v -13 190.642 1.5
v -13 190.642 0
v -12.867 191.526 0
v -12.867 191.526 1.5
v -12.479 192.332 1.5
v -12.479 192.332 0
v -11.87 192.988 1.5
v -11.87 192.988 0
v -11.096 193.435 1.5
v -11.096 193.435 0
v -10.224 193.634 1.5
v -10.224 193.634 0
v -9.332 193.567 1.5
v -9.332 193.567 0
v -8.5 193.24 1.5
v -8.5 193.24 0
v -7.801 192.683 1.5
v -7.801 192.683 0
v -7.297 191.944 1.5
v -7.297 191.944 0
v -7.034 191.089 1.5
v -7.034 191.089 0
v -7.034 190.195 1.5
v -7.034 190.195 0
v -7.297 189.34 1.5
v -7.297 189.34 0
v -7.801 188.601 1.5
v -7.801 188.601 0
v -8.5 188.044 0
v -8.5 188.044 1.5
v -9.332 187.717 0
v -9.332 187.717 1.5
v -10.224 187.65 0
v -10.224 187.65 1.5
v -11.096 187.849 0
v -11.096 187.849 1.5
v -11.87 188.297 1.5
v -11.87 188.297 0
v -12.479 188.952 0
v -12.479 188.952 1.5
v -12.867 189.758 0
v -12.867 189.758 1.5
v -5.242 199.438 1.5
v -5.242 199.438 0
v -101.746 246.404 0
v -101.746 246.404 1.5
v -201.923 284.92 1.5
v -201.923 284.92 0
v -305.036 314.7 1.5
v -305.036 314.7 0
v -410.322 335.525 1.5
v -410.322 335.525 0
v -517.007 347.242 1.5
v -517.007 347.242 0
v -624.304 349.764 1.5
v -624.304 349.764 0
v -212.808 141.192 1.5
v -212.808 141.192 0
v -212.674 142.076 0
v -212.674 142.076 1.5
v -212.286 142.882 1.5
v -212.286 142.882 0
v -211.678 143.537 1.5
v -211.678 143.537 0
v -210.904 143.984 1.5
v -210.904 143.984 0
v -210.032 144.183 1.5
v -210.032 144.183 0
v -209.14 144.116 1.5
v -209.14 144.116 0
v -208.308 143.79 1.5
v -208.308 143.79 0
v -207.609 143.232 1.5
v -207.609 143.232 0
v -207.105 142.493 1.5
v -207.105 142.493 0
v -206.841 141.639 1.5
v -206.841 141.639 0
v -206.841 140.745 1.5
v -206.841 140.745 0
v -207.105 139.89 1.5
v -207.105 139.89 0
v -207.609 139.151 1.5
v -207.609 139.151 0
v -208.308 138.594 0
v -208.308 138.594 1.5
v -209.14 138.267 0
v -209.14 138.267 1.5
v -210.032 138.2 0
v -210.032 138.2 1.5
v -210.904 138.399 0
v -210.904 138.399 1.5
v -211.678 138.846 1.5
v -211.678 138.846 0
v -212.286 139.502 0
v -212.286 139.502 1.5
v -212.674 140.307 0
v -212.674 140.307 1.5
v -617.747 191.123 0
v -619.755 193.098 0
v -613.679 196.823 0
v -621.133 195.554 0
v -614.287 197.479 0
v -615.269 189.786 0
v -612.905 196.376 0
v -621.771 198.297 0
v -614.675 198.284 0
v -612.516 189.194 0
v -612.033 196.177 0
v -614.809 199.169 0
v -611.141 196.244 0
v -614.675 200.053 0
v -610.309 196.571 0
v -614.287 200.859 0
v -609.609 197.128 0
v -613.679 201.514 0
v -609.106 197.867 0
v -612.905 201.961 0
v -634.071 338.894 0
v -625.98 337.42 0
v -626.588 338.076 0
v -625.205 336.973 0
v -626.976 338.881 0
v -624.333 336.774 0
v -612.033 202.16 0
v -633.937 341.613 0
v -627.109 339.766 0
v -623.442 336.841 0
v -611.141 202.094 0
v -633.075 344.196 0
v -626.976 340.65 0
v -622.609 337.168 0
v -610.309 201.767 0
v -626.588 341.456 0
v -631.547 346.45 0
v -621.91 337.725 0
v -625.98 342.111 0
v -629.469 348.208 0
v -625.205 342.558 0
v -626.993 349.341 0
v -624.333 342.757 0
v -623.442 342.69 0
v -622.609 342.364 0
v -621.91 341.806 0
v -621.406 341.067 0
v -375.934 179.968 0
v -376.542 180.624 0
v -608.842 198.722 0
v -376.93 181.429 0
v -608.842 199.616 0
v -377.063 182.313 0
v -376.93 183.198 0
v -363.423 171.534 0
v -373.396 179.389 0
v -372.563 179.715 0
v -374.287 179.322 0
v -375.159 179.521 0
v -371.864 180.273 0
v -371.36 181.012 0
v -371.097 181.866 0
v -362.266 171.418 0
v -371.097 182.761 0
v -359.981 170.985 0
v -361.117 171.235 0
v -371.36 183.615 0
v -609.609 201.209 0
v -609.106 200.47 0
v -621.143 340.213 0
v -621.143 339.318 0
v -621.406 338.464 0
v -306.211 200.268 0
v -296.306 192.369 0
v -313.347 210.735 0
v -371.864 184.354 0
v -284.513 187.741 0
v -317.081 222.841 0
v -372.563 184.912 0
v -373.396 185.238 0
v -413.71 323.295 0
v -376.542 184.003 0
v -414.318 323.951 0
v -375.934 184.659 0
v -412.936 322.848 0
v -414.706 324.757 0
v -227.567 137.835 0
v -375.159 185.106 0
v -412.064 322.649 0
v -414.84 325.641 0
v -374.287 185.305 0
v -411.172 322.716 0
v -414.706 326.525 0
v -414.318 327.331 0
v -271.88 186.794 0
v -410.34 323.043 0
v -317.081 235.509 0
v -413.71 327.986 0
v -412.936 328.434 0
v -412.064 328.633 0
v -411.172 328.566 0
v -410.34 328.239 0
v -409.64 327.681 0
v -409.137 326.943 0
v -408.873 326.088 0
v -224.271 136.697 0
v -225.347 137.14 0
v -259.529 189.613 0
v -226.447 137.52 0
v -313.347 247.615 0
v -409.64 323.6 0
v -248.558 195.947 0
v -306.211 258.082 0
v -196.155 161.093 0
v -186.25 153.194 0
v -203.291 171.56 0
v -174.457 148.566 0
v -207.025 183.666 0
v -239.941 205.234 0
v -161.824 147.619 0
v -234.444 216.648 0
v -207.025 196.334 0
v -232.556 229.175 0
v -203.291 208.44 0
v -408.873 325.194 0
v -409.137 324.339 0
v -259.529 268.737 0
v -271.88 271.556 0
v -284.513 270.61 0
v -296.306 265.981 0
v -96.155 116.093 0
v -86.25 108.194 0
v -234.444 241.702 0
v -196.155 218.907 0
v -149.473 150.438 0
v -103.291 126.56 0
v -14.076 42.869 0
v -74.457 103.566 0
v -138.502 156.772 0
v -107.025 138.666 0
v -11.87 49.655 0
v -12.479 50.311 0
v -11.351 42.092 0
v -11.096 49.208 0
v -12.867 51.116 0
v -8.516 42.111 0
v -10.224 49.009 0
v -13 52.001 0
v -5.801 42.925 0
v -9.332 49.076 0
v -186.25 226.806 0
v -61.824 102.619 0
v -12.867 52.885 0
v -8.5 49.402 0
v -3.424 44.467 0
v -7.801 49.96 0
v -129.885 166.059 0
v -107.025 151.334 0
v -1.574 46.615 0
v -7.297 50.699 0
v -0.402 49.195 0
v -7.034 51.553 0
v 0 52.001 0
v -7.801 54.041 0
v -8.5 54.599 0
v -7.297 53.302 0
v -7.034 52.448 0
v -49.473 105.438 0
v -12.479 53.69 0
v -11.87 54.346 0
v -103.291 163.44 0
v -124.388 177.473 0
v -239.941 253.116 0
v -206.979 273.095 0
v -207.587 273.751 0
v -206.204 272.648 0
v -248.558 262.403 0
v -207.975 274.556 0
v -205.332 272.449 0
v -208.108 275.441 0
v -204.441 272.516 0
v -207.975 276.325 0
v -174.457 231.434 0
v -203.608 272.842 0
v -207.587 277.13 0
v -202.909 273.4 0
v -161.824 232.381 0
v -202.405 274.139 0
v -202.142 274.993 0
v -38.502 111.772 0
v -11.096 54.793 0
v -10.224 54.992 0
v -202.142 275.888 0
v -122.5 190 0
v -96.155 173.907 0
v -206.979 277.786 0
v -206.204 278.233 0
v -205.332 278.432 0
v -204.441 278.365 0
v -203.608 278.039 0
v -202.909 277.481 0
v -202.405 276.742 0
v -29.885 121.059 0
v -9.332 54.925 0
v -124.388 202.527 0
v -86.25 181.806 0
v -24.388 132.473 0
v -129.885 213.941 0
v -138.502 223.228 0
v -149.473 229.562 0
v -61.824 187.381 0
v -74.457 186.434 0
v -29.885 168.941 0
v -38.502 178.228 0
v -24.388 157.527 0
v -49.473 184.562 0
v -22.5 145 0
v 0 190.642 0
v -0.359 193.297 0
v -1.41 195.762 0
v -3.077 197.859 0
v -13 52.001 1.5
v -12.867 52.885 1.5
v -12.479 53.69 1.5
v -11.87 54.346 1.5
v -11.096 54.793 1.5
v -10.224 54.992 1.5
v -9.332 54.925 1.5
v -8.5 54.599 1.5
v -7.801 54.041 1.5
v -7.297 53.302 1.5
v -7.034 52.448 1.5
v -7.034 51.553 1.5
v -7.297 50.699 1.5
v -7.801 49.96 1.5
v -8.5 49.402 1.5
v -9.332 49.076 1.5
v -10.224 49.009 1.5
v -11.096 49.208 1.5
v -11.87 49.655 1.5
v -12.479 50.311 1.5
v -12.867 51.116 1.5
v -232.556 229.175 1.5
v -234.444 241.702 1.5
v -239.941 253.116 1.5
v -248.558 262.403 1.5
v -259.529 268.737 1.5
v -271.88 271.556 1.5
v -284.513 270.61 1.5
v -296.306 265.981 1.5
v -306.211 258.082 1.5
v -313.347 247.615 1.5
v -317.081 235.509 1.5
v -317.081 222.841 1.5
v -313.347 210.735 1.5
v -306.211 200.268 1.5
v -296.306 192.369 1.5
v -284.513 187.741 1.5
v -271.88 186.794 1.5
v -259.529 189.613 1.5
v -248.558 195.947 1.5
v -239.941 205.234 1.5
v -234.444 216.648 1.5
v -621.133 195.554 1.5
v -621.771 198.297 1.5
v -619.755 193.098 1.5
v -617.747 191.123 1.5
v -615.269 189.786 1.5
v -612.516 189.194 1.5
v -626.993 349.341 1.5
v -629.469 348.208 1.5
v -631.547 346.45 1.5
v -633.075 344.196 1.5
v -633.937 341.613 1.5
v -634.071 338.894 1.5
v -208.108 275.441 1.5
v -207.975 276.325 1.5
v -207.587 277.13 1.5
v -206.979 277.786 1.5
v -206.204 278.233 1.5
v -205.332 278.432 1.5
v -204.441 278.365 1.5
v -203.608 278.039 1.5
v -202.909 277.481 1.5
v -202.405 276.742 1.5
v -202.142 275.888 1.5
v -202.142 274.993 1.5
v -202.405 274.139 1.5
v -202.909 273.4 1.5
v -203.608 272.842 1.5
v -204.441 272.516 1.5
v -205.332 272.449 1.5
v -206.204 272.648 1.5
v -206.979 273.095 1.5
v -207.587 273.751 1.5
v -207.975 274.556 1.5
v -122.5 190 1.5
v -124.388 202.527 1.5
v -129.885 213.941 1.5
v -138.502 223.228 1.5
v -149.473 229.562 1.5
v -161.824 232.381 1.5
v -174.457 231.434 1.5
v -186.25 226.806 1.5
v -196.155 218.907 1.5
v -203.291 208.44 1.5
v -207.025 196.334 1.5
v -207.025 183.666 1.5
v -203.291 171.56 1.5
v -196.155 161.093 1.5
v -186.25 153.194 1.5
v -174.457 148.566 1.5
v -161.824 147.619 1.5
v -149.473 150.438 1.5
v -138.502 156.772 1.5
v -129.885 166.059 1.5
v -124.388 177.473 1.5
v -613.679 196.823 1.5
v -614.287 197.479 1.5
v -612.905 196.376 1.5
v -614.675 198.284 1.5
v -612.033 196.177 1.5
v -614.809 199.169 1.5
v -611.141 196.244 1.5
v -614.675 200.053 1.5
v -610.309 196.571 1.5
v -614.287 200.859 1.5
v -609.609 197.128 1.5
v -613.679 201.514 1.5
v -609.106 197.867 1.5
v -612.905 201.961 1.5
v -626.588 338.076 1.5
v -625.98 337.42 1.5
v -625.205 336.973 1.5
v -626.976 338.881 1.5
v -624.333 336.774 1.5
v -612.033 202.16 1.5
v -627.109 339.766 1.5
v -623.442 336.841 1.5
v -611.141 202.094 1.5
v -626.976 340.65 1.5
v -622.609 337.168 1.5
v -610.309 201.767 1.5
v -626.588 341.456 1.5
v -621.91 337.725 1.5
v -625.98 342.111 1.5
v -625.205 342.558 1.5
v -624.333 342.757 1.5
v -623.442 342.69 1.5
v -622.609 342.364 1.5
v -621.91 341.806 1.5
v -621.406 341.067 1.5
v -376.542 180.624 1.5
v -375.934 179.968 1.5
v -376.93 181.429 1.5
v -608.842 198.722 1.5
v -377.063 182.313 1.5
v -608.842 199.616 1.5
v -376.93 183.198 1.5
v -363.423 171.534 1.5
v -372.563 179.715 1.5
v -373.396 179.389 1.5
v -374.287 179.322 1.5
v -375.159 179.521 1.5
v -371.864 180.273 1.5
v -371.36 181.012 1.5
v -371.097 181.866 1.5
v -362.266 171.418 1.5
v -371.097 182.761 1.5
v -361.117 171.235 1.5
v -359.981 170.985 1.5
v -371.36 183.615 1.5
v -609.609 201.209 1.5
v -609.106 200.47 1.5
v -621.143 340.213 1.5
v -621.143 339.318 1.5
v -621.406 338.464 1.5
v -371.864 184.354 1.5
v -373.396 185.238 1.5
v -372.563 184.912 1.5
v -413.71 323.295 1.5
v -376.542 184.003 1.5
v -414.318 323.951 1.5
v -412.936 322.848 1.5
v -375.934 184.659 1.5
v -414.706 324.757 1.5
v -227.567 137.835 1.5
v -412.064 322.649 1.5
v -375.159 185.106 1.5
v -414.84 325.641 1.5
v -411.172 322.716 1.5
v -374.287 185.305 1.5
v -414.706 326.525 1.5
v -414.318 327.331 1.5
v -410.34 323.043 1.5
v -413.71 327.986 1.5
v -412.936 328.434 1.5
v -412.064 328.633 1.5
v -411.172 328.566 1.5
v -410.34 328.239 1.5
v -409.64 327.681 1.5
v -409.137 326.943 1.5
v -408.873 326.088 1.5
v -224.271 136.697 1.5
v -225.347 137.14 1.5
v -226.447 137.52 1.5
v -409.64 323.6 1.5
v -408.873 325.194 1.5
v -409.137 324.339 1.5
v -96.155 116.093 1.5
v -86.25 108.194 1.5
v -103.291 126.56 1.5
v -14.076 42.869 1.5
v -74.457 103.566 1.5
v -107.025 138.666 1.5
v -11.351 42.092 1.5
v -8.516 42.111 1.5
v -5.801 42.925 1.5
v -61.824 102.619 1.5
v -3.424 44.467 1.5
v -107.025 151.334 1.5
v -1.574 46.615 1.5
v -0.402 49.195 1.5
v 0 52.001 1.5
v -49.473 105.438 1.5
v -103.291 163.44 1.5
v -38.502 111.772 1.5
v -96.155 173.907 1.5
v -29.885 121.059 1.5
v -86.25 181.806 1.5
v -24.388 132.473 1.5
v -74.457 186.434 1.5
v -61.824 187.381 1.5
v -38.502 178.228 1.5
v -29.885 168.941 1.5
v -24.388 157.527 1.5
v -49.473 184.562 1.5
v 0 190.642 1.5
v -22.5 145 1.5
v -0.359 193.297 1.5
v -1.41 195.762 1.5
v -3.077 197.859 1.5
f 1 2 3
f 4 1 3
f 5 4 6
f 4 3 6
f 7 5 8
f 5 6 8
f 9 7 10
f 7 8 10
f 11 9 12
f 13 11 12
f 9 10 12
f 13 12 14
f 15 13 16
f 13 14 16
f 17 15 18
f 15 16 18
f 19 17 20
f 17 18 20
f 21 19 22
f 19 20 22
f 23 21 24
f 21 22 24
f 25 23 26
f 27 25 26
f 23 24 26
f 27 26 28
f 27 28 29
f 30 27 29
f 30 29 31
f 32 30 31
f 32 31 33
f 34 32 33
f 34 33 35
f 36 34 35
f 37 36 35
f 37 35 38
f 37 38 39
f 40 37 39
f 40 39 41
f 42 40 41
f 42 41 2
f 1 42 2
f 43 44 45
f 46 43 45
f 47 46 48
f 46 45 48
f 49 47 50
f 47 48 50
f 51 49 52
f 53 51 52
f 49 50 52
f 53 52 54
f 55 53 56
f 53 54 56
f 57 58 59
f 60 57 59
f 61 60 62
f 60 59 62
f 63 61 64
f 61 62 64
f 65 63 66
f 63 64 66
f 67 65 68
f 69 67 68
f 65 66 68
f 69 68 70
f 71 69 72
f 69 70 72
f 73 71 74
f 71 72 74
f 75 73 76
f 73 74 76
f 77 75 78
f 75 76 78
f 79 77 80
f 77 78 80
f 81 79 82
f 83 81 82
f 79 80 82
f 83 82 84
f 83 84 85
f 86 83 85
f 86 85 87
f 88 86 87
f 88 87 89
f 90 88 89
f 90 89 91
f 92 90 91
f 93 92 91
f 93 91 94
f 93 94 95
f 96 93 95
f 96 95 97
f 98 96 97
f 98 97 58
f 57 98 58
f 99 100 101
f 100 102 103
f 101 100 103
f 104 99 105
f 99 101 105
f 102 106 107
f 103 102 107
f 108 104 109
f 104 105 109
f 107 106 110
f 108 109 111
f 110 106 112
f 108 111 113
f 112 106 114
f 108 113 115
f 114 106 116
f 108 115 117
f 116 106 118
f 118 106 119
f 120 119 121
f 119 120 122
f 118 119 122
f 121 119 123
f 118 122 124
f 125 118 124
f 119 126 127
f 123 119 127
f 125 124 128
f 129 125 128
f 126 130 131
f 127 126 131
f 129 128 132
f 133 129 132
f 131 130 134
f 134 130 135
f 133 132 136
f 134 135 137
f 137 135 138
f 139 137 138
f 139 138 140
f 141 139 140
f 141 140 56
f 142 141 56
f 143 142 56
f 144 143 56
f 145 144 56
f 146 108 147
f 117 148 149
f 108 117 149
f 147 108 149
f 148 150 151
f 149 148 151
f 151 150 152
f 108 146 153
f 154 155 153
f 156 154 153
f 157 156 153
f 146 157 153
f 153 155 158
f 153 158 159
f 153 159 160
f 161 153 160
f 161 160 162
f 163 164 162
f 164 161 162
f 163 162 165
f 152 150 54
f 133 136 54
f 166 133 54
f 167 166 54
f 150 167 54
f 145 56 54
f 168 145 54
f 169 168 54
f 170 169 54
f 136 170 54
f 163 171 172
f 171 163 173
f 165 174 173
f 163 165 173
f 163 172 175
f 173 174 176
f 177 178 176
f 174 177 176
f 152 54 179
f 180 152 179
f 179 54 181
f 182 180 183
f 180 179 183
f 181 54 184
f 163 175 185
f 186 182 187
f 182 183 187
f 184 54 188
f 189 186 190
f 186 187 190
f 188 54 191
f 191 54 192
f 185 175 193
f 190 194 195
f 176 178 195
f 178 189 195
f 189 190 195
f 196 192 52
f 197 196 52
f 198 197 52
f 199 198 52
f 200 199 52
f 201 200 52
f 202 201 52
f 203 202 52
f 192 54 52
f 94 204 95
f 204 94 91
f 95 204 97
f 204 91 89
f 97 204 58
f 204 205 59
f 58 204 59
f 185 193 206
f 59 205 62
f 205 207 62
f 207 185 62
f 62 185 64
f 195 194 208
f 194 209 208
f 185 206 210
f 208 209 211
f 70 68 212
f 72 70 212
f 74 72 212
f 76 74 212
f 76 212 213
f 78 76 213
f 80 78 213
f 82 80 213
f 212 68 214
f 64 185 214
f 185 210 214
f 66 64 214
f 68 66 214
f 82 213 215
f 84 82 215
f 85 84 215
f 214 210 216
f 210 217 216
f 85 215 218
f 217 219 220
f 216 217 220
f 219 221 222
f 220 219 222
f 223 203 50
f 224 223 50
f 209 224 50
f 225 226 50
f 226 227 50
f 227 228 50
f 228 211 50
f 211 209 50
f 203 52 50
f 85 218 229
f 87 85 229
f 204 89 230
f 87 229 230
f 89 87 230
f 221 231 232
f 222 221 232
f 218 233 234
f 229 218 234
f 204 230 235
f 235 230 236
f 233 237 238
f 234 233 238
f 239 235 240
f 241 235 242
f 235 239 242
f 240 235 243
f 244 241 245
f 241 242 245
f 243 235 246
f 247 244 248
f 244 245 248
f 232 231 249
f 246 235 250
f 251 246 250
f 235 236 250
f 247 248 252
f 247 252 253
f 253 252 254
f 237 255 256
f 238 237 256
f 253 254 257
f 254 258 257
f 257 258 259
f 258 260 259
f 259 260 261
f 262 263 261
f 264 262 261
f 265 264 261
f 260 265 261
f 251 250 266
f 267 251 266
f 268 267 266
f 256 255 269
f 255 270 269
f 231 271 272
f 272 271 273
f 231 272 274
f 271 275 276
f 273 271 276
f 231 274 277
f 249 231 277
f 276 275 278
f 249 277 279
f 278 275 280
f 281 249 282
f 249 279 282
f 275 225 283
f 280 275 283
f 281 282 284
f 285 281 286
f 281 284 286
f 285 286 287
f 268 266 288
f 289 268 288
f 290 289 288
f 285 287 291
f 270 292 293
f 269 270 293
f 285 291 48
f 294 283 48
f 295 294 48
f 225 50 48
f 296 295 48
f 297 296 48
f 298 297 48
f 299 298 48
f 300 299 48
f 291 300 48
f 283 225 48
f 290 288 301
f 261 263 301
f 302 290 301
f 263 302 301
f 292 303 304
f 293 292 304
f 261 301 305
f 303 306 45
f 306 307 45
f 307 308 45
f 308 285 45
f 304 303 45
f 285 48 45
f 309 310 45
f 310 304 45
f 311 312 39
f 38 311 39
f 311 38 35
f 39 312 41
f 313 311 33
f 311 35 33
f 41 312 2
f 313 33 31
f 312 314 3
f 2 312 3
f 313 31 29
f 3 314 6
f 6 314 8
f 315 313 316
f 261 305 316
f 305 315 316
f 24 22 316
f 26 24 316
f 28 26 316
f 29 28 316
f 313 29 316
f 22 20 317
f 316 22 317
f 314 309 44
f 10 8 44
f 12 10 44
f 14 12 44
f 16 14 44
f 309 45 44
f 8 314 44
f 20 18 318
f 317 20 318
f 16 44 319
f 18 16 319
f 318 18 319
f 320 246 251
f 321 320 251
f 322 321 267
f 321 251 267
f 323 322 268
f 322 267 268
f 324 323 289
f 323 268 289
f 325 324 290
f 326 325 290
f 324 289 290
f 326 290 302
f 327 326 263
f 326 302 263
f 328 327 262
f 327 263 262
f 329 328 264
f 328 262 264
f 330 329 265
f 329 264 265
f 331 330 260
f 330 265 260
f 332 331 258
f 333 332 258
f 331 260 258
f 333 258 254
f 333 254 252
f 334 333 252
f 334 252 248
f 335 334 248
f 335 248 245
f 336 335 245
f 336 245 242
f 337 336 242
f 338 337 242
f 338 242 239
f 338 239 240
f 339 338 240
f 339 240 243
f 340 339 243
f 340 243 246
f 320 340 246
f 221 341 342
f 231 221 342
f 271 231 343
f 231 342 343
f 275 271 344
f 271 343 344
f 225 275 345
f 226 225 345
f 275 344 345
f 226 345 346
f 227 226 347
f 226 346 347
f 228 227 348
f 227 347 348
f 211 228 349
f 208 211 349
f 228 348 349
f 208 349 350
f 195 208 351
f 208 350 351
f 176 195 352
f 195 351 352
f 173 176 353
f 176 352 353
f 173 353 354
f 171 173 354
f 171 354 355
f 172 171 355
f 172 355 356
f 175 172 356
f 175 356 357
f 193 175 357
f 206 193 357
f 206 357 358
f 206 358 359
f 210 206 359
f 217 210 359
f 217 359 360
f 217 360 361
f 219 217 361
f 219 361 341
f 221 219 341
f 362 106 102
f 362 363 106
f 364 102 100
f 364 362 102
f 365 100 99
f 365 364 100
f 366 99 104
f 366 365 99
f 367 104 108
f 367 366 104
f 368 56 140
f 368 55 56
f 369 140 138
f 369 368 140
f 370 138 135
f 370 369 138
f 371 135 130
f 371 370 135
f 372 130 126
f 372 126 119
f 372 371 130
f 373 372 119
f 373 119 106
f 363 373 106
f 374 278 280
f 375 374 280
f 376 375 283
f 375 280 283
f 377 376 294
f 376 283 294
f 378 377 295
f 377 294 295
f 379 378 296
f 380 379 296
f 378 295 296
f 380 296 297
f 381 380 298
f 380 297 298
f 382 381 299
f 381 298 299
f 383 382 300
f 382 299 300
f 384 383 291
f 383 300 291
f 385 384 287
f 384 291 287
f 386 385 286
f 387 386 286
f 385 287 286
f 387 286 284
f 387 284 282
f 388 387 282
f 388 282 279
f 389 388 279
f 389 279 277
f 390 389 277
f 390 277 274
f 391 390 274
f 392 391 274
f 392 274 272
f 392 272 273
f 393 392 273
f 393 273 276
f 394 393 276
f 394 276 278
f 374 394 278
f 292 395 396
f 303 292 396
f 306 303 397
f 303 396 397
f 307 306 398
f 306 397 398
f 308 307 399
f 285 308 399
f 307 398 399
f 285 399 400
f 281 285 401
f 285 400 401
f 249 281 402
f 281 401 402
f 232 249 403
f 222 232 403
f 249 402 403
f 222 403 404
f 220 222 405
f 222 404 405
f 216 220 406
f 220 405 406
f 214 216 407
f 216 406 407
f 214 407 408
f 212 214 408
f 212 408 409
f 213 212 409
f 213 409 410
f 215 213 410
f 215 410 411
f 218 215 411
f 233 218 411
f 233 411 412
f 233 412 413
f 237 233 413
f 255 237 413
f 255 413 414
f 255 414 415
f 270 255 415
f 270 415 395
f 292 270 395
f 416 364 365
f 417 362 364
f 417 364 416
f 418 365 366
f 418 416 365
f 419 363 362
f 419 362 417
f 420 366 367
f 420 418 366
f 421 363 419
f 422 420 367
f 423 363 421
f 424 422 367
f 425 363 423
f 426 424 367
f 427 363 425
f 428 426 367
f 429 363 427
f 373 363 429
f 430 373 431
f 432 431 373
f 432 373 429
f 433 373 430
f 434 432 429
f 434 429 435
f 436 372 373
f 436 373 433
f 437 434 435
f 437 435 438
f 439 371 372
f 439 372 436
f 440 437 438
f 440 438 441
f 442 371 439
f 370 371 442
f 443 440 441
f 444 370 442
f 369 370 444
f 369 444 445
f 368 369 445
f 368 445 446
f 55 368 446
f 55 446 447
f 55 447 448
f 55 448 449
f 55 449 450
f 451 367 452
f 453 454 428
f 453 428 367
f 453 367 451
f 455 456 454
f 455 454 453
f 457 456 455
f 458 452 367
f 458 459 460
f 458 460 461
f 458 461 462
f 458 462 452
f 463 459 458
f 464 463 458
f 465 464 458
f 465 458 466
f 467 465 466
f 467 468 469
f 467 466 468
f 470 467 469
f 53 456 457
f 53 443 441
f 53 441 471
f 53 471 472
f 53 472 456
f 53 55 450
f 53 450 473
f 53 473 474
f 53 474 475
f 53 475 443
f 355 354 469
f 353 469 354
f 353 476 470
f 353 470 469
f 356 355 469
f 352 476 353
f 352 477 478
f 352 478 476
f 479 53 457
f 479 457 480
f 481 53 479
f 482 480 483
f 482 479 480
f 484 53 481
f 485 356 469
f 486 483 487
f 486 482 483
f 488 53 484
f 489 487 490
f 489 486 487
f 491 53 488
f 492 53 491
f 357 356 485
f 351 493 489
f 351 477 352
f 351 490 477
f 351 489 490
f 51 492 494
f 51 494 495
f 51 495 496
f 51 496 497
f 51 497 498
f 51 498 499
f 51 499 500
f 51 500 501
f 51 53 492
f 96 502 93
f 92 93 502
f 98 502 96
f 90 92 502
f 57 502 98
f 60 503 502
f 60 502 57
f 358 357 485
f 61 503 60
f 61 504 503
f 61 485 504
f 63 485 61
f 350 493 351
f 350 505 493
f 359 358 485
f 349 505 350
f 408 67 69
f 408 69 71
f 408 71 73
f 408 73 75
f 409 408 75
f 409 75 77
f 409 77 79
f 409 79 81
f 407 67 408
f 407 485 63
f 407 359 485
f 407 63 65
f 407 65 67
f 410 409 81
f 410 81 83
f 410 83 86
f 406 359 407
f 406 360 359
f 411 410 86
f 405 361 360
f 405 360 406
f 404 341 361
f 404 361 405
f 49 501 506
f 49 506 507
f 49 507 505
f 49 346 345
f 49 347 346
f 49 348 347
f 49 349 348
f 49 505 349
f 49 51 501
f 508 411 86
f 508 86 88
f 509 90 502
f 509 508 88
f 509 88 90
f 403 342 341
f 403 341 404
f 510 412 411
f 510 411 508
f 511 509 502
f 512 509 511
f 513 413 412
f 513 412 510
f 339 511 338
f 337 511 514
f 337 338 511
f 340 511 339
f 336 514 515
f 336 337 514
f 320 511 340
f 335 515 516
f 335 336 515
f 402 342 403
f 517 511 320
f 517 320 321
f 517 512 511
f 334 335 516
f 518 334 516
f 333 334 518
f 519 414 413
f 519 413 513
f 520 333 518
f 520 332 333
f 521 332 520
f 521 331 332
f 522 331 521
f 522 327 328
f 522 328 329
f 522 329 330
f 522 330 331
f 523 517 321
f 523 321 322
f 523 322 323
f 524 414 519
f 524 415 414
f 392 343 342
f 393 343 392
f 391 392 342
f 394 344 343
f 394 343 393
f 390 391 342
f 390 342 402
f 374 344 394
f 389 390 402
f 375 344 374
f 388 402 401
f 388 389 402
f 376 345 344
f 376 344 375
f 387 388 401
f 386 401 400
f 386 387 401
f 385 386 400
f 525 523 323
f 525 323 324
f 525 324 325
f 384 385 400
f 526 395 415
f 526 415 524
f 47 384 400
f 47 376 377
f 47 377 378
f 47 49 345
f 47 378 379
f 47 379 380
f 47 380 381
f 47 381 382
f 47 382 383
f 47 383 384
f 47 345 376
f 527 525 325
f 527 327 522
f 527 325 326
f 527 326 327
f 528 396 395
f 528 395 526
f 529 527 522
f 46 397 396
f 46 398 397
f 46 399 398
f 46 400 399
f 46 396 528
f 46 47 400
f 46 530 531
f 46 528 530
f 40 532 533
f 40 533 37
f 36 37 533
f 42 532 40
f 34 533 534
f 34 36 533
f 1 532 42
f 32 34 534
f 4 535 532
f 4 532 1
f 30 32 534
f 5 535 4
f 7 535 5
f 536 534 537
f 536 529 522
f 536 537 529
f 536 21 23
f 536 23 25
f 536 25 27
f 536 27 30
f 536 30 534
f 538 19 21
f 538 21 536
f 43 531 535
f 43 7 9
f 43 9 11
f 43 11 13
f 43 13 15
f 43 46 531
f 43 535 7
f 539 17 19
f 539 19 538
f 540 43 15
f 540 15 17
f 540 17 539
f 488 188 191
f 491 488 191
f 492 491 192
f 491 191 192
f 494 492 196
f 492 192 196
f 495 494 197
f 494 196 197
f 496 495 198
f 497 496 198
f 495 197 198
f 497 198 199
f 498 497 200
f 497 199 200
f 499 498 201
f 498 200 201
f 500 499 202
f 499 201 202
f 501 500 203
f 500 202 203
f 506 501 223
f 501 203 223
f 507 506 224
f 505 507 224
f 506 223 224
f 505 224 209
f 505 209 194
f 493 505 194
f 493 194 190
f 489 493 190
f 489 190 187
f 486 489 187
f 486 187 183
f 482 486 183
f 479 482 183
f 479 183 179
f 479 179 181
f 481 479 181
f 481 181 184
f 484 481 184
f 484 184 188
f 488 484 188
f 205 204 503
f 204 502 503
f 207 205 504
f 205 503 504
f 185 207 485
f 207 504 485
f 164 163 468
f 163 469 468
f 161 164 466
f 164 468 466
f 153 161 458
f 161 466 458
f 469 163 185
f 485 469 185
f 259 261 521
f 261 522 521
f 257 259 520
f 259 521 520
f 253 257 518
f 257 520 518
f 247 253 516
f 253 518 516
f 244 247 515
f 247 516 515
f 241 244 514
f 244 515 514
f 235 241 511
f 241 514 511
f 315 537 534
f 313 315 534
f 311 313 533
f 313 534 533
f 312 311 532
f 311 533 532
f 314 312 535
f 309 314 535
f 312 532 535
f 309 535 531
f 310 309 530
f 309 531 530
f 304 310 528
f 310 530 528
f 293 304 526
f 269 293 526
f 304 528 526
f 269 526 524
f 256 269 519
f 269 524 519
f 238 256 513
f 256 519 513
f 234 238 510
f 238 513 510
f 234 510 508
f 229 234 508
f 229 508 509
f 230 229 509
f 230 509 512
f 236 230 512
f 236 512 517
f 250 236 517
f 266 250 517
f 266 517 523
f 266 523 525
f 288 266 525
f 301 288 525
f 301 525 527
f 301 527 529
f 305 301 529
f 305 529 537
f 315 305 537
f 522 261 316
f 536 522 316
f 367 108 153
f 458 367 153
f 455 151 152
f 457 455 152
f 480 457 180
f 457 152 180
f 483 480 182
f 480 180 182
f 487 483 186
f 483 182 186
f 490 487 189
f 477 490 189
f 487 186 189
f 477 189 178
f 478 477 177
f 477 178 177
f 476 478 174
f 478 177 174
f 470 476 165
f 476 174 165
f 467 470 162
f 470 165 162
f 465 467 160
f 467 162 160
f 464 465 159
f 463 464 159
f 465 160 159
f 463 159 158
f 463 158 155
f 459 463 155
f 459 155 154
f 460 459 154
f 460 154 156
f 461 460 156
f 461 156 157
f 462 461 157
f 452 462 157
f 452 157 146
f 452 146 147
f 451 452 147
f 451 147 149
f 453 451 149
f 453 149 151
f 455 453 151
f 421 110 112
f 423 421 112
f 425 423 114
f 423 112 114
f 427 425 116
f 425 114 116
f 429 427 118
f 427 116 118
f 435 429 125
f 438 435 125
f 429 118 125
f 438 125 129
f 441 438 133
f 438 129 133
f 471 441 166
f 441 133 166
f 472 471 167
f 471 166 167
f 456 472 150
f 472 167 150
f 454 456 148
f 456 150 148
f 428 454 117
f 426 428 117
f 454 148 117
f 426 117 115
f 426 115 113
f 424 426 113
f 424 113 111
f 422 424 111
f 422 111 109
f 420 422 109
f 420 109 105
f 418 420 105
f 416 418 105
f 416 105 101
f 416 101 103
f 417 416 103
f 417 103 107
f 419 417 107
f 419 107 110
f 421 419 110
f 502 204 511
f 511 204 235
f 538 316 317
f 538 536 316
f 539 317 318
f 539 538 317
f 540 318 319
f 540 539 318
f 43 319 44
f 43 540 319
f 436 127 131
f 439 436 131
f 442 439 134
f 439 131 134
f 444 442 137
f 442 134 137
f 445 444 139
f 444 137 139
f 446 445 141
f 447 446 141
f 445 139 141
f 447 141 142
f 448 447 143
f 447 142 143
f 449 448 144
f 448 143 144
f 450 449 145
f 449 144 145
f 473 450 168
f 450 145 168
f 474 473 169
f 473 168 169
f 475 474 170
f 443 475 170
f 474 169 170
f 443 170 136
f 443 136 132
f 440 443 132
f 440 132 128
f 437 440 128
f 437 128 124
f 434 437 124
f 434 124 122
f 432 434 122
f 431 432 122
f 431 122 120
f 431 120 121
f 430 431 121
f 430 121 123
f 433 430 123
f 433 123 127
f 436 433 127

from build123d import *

# Parameters (mm, degrees)
F1_DEPTH = 1.5
F2_R     = 42.5
F3_DEPTH = 1.501
F4_R     = 10
F5_R     = 20
F7_D     = 6


with BuildPart() as f1:
    # F0 (on Top) → F1 (new body)
    with BuildSketch(Plane.XY):
        with BuildLine():
            Line((0, 36.5856099731), (0, 196.5856099731))
            ThreePointArc((0, 196.5856099731), (-307.3351576975, 315.2560594706), (-635, 349.5099039223))
            Line((-635, 349.5099039223), (-621.0269461922, 189.7971680702))
            Line((-621.0269461922, 189.7971680702), (-361.6779078132, 171.4103170113))
            Line((-361.6779078132, 171.4103170113), (-225.8692382849, 137.4102393502))
            Line((-225.8692382849, 137.4102393502), (0, 36.5856099731))
        make_face()
    extrude(amount=F1_DEPTH)

    # F2 (on face) → F3 (cut, through all)
    with BuildSketch(Plane.XY.offset(1.5)):
        with Locations((-275.0559937421, 229.17509395)):
            Circle(F2_R)
        with Locations((-165, 190)):
            Circle(F2_R)
        with Locations((-65, 145)):
            Circle(F2_R)
    extrude(amount=-F3_DEPTH, mode=Mode.SUBTRACT)

    # F4
    f4_edges = [f1.edges().sort_by_distance(p)[0] for p in [
        (0, 196.58561, 0.75),
        (-635, 349.509904, 0.75),
        (-621.026946, 189.797168, 0.75),
        (0, 36.58561, 0.75),
    ]]
    fillet(f4_edges, radius=F4_R)

    # F5
    f5_edges = [f1.edges().sort_by_distance(p)[0] for p in [
        (-361.677908, 171.410317, 0.75),
        (-225.869238, 137.410239, 0.75),
    ]]
    fillet(f5_edges, radius=F5_R)

    # F7 (through all)
    with Locations(Plane.XY.offset(1.5)):
        with Locations((-624.1092854766, 339.7655997622), (-611.8086529213, 199.1687262985), (-411.8395238612, 325.6409079413), (-374.0631195885, 182.3134808013), (-205.1081070963, 275.4405101573), (-209.8076952351, 141.1916790514), (-10, 190.6420127613), (-10, 52.0005303507)):
            Hole(F7_D / 2)


solid = f1.part
